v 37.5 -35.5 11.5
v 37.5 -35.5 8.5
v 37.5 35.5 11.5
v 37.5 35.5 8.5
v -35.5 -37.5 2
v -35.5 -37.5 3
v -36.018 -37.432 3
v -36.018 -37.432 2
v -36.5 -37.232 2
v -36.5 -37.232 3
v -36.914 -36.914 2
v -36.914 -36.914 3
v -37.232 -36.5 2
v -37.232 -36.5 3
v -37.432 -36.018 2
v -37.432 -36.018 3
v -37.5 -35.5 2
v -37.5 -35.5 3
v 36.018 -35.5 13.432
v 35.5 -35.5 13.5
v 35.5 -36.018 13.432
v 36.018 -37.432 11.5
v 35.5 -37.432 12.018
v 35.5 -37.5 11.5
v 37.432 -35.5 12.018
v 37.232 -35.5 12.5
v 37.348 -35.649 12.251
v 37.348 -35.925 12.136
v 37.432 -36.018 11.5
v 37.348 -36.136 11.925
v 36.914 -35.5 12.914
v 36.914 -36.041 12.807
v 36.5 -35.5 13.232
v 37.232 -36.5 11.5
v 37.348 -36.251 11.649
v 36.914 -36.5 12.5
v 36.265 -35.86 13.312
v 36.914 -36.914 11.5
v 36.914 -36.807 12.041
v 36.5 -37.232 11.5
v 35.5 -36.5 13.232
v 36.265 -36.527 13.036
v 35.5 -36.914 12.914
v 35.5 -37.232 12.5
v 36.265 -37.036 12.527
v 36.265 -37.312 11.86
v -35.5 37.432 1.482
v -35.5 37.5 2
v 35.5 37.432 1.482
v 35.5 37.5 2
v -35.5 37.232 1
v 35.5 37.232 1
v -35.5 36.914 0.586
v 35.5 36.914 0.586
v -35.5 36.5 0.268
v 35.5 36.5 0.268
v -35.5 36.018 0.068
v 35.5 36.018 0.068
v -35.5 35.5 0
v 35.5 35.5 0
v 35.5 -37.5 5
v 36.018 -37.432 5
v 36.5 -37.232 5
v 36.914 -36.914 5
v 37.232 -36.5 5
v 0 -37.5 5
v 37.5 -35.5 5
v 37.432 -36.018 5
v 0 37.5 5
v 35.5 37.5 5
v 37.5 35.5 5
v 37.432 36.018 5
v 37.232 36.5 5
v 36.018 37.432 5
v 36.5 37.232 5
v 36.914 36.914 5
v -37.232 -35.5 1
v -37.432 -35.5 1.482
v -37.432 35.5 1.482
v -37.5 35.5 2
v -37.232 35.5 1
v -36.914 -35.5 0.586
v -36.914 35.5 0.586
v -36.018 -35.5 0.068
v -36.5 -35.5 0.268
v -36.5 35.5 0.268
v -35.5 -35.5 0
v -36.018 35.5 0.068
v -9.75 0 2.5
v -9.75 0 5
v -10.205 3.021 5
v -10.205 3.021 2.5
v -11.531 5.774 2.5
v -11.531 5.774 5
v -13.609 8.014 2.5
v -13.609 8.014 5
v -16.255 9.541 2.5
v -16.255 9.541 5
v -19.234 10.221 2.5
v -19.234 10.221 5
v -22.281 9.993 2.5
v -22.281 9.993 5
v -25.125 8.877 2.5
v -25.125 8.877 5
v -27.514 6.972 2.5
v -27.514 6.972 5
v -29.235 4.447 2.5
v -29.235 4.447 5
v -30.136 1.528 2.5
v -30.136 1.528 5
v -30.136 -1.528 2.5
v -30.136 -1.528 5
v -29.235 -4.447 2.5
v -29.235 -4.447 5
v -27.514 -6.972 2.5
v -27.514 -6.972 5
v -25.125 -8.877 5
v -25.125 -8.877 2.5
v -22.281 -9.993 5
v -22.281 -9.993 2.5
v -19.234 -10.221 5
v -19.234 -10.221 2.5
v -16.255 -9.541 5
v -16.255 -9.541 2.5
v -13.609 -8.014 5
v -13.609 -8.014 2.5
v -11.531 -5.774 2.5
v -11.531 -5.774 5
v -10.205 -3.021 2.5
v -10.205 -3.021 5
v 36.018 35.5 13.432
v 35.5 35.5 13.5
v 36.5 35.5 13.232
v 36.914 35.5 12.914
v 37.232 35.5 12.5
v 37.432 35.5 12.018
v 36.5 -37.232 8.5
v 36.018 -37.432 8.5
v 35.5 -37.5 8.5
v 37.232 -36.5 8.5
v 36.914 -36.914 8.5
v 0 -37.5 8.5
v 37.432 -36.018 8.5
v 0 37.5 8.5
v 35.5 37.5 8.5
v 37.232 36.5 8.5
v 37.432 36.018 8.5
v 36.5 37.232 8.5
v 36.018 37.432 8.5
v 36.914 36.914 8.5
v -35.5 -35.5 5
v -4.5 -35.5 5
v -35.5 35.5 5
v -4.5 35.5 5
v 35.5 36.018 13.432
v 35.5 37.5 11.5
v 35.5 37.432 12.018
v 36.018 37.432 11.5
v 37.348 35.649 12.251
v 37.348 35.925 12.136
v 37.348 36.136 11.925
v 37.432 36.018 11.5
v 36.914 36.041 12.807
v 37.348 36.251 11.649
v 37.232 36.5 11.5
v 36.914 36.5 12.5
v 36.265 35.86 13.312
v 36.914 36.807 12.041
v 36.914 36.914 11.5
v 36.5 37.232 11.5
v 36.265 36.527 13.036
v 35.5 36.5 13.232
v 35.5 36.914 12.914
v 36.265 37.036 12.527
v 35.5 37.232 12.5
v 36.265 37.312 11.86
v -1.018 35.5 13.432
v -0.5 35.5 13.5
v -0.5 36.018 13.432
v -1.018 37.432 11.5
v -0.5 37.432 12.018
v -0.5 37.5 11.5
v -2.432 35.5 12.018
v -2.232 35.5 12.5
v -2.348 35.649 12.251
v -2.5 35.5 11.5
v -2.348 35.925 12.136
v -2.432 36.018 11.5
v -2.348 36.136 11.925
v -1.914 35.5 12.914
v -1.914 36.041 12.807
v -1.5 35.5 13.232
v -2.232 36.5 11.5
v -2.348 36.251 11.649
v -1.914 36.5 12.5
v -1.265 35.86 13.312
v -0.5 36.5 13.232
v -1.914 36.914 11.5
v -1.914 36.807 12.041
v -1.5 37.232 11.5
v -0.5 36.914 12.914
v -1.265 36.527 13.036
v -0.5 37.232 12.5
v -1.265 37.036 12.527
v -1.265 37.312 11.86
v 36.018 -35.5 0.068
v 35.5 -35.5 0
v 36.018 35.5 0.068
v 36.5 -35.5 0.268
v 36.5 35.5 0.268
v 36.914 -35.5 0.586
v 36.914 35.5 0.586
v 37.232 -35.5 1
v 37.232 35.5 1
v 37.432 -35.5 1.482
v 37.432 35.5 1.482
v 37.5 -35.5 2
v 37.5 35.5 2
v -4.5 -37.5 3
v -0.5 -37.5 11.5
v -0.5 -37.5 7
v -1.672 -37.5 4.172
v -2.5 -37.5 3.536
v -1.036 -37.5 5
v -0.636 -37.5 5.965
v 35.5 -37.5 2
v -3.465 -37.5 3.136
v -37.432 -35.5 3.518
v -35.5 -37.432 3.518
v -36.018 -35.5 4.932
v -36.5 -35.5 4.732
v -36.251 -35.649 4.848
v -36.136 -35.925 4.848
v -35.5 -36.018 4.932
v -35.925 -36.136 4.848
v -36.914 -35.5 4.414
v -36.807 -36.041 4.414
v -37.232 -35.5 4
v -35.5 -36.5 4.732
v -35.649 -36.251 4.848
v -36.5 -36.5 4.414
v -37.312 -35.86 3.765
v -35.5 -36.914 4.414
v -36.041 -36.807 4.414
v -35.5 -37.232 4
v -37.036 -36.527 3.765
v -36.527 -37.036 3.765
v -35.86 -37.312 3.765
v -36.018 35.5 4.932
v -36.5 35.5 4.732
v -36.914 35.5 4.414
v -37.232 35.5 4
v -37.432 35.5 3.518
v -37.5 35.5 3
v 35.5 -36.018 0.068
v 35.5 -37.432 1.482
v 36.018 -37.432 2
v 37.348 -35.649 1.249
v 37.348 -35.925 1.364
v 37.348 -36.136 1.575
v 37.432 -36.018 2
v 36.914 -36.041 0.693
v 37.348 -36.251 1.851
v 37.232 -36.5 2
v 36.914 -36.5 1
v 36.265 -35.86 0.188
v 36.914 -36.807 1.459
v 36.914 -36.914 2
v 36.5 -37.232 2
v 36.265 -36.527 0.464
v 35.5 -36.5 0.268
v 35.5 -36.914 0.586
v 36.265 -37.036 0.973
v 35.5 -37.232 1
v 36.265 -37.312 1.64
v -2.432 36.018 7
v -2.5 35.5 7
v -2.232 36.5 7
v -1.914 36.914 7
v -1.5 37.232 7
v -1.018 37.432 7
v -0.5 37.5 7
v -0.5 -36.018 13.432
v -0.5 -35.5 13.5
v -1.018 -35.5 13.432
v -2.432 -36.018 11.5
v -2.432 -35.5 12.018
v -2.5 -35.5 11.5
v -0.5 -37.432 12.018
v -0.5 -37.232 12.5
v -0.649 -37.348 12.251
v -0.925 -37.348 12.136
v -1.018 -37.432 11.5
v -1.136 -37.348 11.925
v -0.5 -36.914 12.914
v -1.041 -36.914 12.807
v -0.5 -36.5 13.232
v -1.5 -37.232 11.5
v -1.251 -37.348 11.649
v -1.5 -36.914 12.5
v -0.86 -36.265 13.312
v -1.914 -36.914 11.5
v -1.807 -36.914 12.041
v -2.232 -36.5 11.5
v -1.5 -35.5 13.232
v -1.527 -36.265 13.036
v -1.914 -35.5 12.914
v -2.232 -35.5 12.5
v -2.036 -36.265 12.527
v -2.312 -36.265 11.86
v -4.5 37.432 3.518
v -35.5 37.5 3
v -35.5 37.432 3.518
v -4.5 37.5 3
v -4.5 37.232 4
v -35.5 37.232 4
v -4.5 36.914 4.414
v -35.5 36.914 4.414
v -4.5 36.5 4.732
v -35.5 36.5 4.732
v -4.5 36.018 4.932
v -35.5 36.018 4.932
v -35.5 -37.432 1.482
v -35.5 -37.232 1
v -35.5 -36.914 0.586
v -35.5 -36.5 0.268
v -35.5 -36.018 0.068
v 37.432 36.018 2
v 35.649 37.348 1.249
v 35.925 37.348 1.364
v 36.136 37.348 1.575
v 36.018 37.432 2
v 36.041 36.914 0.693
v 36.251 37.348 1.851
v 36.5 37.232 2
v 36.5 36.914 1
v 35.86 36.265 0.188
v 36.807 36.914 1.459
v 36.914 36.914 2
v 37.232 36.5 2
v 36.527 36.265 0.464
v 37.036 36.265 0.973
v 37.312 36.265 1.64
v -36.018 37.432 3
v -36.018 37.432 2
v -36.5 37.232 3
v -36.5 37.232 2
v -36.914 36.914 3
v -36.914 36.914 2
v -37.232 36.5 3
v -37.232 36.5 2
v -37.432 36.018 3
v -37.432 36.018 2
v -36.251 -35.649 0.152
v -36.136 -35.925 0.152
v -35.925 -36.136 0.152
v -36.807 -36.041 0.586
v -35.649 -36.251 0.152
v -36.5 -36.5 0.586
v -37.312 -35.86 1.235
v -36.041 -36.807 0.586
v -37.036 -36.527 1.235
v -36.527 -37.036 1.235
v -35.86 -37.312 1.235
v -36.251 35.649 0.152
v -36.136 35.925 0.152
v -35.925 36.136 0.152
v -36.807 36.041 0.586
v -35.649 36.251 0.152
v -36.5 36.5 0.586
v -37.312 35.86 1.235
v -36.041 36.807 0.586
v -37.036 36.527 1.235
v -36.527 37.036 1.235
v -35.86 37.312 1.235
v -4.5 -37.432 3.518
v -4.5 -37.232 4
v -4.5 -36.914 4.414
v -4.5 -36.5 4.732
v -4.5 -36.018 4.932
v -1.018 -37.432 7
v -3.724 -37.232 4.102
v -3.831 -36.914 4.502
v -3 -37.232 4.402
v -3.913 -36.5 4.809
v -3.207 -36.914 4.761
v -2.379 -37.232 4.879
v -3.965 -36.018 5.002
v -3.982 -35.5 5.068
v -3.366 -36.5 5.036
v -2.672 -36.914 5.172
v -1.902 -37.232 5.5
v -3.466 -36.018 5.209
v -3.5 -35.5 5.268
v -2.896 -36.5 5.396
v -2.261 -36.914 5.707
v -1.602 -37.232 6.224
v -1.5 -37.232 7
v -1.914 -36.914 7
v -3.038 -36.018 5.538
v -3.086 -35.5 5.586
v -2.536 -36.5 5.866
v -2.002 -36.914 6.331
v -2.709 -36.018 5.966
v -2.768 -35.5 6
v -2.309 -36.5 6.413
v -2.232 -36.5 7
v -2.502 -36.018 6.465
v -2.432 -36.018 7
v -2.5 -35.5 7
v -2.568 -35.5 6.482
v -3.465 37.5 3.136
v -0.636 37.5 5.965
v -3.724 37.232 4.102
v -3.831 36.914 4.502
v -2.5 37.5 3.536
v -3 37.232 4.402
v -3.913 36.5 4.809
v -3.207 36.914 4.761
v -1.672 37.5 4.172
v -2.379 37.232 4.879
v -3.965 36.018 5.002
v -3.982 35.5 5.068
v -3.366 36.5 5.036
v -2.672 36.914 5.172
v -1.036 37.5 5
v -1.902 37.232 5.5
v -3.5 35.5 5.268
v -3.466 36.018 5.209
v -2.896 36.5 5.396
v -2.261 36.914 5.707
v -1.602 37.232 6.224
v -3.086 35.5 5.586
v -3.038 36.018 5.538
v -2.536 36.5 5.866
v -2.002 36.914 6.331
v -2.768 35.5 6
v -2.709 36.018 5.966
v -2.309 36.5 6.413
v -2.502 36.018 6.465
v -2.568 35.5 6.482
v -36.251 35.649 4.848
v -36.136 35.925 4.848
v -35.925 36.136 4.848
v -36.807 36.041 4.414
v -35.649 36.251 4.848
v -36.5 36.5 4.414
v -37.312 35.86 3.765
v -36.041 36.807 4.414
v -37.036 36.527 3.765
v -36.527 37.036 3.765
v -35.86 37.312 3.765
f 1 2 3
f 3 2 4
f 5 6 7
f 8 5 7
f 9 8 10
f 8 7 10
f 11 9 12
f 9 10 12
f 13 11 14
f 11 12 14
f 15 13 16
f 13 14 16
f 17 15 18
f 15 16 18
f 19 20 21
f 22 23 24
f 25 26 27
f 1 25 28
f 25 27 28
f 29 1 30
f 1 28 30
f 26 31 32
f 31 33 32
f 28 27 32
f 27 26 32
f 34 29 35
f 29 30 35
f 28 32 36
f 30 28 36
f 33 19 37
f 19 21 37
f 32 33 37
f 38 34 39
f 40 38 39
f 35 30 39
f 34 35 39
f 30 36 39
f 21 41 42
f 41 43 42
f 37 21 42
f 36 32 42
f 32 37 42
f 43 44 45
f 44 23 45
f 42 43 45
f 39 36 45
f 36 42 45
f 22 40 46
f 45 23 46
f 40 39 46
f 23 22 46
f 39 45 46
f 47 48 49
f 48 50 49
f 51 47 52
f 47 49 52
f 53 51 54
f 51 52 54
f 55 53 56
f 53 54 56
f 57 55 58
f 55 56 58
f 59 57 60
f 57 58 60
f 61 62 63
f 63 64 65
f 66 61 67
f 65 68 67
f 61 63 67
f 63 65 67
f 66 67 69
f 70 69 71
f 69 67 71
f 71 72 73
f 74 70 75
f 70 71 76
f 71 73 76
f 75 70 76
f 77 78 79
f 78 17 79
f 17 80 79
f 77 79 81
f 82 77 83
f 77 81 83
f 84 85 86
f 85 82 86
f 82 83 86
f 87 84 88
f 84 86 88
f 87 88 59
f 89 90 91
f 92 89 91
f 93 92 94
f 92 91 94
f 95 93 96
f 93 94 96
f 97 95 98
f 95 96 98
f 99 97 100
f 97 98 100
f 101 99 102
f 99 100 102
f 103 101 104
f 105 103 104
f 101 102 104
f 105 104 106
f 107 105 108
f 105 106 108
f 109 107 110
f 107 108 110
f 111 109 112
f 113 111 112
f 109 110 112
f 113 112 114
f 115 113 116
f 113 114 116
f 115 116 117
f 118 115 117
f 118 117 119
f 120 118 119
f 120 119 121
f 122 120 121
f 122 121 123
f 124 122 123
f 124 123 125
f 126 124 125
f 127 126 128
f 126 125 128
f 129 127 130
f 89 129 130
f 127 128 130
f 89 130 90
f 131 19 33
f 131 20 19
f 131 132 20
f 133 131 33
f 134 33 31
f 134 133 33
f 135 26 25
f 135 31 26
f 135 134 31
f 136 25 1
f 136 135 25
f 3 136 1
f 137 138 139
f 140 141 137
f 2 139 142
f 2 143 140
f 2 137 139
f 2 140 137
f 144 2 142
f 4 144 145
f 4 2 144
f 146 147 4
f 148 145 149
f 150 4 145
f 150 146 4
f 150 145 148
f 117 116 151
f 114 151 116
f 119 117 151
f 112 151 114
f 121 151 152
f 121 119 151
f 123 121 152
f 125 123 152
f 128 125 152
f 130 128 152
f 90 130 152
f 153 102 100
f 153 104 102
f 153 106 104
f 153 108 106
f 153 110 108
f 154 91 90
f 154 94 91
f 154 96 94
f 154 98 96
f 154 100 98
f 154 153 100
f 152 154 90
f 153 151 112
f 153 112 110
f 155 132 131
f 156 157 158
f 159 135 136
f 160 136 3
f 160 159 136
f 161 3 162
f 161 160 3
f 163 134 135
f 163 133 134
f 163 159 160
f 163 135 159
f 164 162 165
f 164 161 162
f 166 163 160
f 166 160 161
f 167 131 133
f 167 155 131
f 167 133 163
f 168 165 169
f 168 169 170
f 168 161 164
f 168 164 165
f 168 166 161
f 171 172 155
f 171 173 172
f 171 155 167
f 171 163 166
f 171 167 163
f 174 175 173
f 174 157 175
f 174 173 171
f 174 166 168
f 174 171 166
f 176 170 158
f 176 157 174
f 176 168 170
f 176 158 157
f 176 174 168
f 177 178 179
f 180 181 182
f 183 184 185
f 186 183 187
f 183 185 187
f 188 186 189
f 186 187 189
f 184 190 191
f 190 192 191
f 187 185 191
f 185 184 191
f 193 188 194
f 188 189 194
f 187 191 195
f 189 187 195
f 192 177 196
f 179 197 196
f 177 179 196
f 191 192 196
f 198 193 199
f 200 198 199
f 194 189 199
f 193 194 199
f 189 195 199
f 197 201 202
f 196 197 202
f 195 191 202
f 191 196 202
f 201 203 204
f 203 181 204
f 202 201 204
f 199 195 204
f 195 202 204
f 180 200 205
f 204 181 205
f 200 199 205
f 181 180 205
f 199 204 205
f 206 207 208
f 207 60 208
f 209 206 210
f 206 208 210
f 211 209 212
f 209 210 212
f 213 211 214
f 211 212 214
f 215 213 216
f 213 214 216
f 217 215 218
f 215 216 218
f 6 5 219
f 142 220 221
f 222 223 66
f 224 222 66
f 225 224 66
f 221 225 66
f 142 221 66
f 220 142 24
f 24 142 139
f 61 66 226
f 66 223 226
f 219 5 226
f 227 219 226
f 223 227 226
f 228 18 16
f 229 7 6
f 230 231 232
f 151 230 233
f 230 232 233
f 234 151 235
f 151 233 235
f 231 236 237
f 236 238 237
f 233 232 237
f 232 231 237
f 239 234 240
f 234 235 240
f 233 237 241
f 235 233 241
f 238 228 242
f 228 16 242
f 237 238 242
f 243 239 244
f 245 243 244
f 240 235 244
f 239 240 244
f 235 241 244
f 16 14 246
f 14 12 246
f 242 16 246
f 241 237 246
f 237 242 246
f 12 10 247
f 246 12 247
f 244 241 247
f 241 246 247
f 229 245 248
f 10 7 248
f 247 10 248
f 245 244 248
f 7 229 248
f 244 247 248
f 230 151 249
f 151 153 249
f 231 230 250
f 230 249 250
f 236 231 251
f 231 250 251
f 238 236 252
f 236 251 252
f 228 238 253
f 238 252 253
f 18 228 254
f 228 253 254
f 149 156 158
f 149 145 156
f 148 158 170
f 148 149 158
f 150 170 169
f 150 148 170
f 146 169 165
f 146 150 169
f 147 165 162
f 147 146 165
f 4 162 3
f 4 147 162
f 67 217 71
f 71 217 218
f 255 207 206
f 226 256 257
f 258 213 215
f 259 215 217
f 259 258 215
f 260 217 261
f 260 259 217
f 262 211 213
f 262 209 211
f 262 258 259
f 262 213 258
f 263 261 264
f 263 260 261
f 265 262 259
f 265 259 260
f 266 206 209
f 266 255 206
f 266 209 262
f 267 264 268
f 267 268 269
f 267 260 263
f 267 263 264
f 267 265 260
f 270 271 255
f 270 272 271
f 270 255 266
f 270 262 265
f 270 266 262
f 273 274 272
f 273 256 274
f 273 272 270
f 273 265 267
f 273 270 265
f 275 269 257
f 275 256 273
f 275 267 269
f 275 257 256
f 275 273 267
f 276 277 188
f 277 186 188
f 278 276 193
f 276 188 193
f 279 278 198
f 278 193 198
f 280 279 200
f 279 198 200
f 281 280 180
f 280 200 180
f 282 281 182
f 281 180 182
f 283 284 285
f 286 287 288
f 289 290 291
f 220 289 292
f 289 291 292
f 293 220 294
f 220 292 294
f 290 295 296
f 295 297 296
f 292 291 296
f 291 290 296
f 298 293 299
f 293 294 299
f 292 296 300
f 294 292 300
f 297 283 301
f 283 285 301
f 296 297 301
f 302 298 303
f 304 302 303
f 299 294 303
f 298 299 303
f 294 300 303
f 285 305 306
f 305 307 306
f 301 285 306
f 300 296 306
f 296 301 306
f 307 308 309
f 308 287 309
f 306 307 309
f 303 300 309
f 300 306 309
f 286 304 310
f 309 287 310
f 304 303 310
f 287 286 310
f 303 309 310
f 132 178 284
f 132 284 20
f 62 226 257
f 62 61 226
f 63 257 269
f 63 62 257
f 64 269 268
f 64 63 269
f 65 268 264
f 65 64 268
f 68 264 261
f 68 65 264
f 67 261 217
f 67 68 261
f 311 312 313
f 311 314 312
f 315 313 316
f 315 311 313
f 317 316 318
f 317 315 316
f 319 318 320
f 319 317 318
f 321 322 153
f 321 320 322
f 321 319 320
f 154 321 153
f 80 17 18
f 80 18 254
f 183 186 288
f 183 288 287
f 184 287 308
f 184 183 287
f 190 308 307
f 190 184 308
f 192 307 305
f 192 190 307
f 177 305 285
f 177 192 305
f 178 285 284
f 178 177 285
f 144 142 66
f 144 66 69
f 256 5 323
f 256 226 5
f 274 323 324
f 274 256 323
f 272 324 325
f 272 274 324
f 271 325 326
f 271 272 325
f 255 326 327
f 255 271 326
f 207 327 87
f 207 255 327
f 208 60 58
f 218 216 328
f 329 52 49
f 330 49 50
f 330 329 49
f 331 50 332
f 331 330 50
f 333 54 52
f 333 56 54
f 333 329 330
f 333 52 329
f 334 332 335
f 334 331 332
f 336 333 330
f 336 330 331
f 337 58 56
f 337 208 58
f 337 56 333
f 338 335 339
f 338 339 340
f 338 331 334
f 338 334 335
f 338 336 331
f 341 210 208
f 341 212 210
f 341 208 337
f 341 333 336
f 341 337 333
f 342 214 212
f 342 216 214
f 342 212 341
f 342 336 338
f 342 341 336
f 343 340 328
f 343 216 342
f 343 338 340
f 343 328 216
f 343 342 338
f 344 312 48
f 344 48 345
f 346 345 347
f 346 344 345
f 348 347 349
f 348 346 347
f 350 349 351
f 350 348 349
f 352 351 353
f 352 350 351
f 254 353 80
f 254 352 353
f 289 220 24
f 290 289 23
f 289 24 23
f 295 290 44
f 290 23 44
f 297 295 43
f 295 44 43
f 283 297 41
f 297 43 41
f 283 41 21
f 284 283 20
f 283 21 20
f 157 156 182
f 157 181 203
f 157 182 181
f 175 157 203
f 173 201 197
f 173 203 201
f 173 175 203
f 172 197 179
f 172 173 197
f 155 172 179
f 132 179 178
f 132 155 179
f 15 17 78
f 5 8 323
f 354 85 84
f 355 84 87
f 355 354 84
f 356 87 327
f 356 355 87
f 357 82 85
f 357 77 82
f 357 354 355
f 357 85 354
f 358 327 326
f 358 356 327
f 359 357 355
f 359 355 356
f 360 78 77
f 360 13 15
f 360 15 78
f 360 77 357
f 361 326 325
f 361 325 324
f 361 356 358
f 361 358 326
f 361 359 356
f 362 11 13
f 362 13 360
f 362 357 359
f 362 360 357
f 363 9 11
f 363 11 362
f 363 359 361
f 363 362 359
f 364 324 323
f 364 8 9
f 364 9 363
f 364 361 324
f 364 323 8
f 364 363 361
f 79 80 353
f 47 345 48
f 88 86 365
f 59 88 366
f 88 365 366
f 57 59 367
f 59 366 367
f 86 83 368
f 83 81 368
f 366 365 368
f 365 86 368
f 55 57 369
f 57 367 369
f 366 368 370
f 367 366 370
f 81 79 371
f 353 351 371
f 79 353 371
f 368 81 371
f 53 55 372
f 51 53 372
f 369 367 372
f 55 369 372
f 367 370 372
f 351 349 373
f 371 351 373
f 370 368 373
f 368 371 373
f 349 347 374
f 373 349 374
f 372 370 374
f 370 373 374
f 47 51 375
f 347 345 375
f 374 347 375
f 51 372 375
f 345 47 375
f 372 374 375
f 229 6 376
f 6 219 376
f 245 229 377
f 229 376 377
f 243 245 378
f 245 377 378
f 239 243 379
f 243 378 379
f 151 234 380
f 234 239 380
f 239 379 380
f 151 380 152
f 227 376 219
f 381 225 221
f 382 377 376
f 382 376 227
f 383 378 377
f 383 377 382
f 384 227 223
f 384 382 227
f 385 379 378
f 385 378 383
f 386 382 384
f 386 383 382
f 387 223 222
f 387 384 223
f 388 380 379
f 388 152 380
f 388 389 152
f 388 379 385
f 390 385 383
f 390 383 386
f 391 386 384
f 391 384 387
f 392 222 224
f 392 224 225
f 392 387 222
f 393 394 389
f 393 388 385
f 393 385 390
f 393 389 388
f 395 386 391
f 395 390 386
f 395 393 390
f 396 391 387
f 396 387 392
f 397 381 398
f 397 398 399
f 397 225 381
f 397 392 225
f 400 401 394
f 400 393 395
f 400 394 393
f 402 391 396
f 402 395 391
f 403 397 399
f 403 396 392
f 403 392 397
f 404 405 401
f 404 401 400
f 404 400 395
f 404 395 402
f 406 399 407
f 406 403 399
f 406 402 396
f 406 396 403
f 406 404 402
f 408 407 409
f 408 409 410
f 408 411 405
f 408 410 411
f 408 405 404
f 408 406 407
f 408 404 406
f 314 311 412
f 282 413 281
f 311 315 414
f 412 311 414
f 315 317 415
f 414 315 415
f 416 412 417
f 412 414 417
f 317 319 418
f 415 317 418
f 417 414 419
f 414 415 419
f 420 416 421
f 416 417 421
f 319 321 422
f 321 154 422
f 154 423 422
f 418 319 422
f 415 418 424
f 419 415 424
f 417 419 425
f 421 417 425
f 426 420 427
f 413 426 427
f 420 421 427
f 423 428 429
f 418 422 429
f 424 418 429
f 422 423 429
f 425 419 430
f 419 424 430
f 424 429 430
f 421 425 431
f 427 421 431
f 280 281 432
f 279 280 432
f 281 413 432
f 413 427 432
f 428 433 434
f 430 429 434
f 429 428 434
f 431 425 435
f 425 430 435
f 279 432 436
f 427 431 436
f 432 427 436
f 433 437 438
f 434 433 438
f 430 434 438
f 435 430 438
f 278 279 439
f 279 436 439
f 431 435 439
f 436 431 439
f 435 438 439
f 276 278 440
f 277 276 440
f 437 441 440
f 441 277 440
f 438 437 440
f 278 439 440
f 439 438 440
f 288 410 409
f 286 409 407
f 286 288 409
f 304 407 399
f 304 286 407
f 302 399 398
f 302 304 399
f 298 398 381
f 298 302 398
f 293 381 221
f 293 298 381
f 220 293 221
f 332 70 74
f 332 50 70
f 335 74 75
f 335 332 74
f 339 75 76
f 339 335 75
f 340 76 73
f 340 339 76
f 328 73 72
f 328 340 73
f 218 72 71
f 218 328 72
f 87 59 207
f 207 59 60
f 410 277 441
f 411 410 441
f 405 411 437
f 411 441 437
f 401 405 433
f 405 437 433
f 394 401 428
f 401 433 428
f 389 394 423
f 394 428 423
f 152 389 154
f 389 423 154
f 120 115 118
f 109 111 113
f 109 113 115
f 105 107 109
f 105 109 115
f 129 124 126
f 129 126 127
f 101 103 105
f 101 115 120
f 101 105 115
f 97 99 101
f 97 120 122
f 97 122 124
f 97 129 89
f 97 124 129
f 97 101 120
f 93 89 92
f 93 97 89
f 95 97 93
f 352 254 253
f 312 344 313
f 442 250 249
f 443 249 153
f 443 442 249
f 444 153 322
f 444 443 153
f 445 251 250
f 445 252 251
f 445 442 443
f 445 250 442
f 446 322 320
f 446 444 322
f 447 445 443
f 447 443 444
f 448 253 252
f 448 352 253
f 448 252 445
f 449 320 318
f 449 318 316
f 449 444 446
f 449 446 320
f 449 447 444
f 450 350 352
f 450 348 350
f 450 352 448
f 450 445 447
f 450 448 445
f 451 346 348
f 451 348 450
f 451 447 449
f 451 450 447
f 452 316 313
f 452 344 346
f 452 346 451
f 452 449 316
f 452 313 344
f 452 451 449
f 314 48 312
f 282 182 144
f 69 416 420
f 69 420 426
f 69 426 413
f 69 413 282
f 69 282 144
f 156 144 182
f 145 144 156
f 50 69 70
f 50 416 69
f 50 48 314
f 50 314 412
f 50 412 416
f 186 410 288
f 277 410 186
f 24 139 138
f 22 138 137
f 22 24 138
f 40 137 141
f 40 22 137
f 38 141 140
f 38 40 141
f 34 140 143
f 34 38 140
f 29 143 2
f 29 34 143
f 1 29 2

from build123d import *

# Parameters (mm, degrees)
F0_W     = 75
F0_H     = 75
F1_DEPTH = 5
F2_W     = 40
F2_H     = 75
F3_DEPTH = 8.5
F4_W     = 75
F4_H     = 3.5
F5_DEPTH = 37.5
F6_R     = 10.25
F7_DEPTH = 2.5
F8_R     = 2


with BuildPart() as f1:
    # F0 (on Top) → F1 (new body)
    with BuildSketch(Plane.XY):
        Rectangle(F0_W, F0_H)
    extrude(amount=F1_DEPTH)

    # F2 (on face) → F3 (join)
    with BuildSketch(Plane.XY.offset(5)):
        with Locations((17.5, 0)):
            Rectangle(F2_W, F2_H)
    extrude(amount=F3_DEPTH)

    # F4 (on face) → F5 (cut, through all)
    with BuildSketch(Plane.YZ.offset(37.5)):
        with Locations((0, 6.75)):
            Rectangle(F4_W, F4_H)
    extrude(amount=-F5_DEPTH, mode=Mode.SUBTRACT)

    # F6 (on face) → F7 (cut)
    with BuildSketch(Plane.XY.offset(5)):
        with Locations((-20, 0)):
            Circle(F6_R)
    extrude(amount=-F7_DEPTH, mode=Mode.SUBTRACT)

    # F8
    f8_edges = [f1.edges().sort_by_distance(p)[0] for p in [
        (17.5, 37.5, 13.5),
        (-2.5, 0, 13.5),
        (17.5, -37.5, 13.5),
        (37.5, 0, 13.5),
        (-2.5, 37.5, 9.25),
        (-2.5, -37.5, 9.25),
        (-2.5, 0, 5),
        (-37.5, 37.5, 2.5),
        (-37.5, -37.5, 2.5),
        (-37.5, 0, 0),
        (-37.5, 0, 5),
        (0, -37.5, 0),
        (37.5, 0, 0),
        (0, 37.5, 0),
        (37.5, -37.5, 11),
        (37.5, -37.5, 2.5),
        (37.5, 37.5, 11),
        (37.5, 37.5, 2.5),
        (-20, -37.5, 5),
        (-20, 37.5, 5),
    ]]
    fillet(f8_edges, radius=F8_R)


solid = f1.part
